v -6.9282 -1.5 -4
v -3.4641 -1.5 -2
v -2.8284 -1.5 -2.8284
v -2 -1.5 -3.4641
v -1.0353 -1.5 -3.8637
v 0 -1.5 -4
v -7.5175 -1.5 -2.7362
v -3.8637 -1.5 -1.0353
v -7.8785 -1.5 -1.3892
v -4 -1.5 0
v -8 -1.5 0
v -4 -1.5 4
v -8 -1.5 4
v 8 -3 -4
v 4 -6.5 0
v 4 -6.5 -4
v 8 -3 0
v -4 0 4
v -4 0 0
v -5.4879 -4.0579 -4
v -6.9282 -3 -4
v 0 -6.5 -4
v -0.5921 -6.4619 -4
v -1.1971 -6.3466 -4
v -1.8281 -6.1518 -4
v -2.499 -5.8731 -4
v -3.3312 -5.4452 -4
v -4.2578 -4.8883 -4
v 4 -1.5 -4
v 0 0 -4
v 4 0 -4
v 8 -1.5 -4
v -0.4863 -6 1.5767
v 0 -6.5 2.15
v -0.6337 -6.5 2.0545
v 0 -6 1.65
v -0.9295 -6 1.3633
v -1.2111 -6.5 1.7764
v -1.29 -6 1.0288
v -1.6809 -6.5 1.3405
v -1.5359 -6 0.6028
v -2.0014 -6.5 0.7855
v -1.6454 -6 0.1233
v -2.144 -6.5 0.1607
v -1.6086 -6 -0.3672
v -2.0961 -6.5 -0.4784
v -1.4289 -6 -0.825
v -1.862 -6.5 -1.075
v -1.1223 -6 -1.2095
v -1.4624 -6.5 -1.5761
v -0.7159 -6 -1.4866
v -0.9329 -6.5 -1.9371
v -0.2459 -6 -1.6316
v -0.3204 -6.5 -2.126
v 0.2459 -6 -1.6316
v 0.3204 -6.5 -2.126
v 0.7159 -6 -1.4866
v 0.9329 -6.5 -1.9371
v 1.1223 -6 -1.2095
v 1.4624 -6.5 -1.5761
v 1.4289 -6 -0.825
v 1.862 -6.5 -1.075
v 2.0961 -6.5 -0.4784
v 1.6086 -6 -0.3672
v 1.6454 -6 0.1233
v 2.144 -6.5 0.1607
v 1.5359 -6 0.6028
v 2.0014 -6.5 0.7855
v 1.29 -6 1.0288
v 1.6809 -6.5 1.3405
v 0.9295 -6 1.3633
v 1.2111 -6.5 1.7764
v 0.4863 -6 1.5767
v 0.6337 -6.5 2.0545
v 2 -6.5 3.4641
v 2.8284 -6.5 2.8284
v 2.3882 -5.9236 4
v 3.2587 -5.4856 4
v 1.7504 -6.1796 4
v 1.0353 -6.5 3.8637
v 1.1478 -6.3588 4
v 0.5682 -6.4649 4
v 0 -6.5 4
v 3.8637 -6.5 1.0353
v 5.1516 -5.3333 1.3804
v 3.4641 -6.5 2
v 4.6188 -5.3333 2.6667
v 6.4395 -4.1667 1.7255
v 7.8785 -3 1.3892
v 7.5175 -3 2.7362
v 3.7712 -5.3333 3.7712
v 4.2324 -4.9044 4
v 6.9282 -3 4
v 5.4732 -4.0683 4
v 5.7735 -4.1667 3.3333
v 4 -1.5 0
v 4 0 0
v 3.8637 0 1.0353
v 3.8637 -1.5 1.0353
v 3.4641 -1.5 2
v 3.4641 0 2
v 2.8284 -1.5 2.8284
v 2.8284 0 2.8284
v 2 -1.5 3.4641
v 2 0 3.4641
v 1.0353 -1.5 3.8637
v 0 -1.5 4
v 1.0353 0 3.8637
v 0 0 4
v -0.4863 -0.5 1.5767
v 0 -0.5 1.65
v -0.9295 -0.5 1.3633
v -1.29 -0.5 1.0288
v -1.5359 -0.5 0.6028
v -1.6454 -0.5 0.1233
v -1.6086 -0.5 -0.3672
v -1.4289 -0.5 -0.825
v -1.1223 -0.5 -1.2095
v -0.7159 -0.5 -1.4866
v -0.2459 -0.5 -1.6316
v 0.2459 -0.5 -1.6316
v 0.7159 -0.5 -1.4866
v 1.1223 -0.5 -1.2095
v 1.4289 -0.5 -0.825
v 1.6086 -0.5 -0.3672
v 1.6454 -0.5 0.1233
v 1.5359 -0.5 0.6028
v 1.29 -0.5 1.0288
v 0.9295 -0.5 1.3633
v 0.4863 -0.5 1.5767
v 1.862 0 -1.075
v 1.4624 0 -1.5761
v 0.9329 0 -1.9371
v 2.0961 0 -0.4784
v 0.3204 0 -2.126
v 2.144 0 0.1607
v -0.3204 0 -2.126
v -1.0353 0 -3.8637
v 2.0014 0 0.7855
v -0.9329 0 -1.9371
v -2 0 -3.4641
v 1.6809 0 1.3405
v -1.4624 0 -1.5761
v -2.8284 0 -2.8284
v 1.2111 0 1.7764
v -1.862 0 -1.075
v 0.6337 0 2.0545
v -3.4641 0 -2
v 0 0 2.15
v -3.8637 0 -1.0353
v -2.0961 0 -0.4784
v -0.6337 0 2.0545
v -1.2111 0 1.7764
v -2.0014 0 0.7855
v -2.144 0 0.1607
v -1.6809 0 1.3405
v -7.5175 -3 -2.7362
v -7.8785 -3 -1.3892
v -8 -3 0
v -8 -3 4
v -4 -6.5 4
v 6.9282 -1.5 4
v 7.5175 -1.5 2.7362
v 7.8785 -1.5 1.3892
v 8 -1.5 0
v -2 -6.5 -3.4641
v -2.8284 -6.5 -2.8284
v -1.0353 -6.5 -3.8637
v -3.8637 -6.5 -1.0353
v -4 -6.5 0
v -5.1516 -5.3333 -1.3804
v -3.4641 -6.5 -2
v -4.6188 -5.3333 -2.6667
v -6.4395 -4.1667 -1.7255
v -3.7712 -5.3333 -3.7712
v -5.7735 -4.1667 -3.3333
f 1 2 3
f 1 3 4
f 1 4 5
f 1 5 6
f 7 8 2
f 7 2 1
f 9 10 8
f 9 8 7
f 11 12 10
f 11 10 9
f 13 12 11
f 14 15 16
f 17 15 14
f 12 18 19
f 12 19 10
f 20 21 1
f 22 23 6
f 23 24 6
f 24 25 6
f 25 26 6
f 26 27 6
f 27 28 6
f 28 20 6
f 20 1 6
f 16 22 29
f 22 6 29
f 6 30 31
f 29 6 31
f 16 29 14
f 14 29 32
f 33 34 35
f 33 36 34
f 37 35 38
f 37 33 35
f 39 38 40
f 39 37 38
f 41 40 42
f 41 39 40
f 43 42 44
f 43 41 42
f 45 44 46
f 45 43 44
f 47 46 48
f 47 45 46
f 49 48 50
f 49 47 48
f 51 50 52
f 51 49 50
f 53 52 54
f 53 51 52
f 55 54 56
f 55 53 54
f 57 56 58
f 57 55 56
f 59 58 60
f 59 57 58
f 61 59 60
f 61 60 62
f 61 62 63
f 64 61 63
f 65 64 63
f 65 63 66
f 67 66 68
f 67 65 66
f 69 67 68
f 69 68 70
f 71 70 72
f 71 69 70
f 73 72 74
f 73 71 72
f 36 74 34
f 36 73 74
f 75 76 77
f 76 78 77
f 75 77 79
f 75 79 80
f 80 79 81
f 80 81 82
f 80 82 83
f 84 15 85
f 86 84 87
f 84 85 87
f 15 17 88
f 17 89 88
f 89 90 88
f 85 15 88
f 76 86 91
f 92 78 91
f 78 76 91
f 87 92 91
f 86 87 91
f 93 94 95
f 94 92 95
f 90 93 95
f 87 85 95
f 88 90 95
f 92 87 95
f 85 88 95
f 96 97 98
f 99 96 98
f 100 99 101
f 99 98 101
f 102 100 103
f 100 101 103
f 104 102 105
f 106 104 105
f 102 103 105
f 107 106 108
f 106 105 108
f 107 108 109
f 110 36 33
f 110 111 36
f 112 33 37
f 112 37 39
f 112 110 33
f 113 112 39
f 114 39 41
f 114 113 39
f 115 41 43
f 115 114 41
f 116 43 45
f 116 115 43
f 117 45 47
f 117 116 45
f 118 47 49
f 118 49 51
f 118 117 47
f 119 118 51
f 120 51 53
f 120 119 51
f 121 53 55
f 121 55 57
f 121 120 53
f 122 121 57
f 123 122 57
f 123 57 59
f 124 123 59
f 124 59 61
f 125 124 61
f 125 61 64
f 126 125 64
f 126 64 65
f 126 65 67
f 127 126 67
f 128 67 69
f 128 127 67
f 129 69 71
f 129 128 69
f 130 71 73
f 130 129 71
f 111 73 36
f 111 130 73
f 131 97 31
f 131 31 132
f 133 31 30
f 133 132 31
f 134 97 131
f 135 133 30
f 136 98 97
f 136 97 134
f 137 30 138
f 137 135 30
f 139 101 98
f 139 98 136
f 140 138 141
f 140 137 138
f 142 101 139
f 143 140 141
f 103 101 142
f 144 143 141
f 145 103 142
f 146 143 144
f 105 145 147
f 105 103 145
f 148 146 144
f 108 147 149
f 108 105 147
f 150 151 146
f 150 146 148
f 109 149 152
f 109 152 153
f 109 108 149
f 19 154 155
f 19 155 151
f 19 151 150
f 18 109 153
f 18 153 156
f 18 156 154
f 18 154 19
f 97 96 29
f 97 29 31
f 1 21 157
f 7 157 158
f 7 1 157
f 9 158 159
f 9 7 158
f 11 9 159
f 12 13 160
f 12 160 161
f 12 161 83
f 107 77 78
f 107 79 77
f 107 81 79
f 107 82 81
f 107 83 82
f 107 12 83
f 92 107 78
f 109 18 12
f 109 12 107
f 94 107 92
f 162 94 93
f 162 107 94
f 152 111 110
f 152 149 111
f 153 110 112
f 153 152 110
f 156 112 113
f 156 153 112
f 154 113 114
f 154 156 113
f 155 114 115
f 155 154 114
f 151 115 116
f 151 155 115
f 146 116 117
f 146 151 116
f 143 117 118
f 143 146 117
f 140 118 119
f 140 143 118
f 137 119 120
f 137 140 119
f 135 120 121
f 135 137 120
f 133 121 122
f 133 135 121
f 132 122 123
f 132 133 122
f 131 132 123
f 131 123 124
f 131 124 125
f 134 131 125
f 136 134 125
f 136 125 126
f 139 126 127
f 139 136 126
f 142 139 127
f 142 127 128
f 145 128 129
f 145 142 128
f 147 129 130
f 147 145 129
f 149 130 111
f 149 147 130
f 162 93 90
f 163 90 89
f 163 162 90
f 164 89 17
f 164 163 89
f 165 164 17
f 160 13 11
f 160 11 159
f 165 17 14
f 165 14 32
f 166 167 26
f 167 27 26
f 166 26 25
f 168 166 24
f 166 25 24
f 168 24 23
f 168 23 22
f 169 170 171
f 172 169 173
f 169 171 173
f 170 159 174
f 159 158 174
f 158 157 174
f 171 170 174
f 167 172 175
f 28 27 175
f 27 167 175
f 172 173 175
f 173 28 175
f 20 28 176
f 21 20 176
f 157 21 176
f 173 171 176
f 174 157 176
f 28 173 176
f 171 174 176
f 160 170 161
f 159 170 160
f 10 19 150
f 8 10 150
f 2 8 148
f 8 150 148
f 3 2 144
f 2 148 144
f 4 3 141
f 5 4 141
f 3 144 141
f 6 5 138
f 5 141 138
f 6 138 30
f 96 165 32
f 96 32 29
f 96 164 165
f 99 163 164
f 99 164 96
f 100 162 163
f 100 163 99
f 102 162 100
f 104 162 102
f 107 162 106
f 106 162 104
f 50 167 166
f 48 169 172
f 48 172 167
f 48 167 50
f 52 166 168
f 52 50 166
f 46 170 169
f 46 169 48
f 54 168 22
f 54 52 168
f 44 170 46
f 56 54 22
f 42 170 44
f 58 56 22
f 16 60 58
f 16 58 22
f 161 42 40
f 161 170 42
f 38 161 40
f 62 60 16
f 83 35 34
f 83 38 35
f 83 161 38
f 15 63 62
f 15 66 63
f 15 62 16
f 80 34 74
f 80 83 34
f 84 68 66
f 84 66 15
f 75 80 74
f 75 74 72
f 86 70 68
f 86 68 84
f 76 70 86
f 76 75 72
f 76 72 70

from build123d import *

# Parameters (mm, degrees)
EXTRUDE_1_DEPTH     = 4
CUT_EXTRUDE_1_DEPTH = 1.5
CUT_EXTRUDE_2_DEPTH = 6


with BuildPart() as part:
    # Эскиз1 → Бобышка-Вытянуть1 (new body, symmetric)
    with BuildSketch(Plane.XY):
        Polygon((4, 0), (-4, 0), (-4, -1.5), (-8, -1.5), (-8, -6.5), (8, -6.5), (8, -1.5), (4, -1.5), align=None)
    extrude(amount=EXTRUDE_1_DEPTH, both=True)

    # Эскиз3 → Отверстие обработанное метчиком M42 (revolve, cut)
    with BuildSketch(Plane(origin=(0, 0, 0), x_dir=(0, 0, 1), z_dir=(1, 0, 0))):
        Polygon((0, 0), (0, 6.5), (2.15, 6.5), (1.65, 6), (1.65, 0.5), (2.15, 0), align=None)
    revolve(axis=Axis((0, 6.35, 0), (0, -1, 0)), mode=Mode.SUBTRACT)

    # Эскиз4 → Вырез-Вытянуть1 (cut)
    with BuildSketch(Plane(origin=(0, 0, 0), x_dir=(1, 0, 0), z_dir=(0, 1, 0))):
        with BuildLine():
            Line((-4, 4), (-4, 0))
            ThreePointArc((-4, 0), (-2.828427125, 2.828427125), (0, 4))
            Line((0, 4), (-4, 4))
        make_face()
        with BuildLine():
            Line((0, -4), (4, -4))
            Line((4, -4), (4, 0))
            ThreePointArc((4, 0), (2.828427125, -2.828427125), (0, -4))
        make_face()
    extrude(amount=-CUT_EXTRUDE_1_DEPTH, mode=Mode.SUBTRACT)

    # Эскиз5 → Вырез-Вытянуть2 (cut, through all)
    with BuildSketch(Plane(origin=(0, -1.5, 0), x_dir=(1, 0, 0), z_dir=(0, 1, 0))):
        with BuildLine():
            Line((-8, 0), (-8, 4))
            Line((-8, 4), (-6.92820323, 4))
            ThreePointArc((-6.92820323, 4), (-7.72740661, 2.070552361), (-8, 0))
        make_face()
        with BuildLine():
            Line((8, 0), (8, -4))
            Line((8, -4), (6.92820323, -4))
            ThreePointArc((6.92820323, -4), (7.72740661, -2.070552361), (8, 0))
        make_face()
    extrude(amount=-CUT_EXTRUDE_2_DEPTH, mode=Mode.SUBTRACT)

    # Вырез-По траектории1: sweep along a path in Эскиз7
    with BuildLine(Plane.XZ.offset(6.5)) as sweep_1_path:
        Line((0, 8), (-8, 8))
        Line((-8, 8), (-8, 0))
        ThreePointArc((-8, 0), (-5.656854249, -5.656854249), (0, -8))
        Line((0, -8), (8, -8))
        Line((8, -8), (8, 0))
        ThreePointArc((8, 0), (5.656854249, 5.656854249), (0, 8))
    # Эскиз6 → Вырез-По траектории1 (sweep, cut)
    with BuildSketch(Plane.XY.offset(4)):
        Polygon((-8, -3), (-8, -6.5), (-4, -6.5), align=None)
    sweep(path=sweep_1_path.line, transition=Transition.RIGHT, mode=Mode.SUBTRACT)


solid = part.part
